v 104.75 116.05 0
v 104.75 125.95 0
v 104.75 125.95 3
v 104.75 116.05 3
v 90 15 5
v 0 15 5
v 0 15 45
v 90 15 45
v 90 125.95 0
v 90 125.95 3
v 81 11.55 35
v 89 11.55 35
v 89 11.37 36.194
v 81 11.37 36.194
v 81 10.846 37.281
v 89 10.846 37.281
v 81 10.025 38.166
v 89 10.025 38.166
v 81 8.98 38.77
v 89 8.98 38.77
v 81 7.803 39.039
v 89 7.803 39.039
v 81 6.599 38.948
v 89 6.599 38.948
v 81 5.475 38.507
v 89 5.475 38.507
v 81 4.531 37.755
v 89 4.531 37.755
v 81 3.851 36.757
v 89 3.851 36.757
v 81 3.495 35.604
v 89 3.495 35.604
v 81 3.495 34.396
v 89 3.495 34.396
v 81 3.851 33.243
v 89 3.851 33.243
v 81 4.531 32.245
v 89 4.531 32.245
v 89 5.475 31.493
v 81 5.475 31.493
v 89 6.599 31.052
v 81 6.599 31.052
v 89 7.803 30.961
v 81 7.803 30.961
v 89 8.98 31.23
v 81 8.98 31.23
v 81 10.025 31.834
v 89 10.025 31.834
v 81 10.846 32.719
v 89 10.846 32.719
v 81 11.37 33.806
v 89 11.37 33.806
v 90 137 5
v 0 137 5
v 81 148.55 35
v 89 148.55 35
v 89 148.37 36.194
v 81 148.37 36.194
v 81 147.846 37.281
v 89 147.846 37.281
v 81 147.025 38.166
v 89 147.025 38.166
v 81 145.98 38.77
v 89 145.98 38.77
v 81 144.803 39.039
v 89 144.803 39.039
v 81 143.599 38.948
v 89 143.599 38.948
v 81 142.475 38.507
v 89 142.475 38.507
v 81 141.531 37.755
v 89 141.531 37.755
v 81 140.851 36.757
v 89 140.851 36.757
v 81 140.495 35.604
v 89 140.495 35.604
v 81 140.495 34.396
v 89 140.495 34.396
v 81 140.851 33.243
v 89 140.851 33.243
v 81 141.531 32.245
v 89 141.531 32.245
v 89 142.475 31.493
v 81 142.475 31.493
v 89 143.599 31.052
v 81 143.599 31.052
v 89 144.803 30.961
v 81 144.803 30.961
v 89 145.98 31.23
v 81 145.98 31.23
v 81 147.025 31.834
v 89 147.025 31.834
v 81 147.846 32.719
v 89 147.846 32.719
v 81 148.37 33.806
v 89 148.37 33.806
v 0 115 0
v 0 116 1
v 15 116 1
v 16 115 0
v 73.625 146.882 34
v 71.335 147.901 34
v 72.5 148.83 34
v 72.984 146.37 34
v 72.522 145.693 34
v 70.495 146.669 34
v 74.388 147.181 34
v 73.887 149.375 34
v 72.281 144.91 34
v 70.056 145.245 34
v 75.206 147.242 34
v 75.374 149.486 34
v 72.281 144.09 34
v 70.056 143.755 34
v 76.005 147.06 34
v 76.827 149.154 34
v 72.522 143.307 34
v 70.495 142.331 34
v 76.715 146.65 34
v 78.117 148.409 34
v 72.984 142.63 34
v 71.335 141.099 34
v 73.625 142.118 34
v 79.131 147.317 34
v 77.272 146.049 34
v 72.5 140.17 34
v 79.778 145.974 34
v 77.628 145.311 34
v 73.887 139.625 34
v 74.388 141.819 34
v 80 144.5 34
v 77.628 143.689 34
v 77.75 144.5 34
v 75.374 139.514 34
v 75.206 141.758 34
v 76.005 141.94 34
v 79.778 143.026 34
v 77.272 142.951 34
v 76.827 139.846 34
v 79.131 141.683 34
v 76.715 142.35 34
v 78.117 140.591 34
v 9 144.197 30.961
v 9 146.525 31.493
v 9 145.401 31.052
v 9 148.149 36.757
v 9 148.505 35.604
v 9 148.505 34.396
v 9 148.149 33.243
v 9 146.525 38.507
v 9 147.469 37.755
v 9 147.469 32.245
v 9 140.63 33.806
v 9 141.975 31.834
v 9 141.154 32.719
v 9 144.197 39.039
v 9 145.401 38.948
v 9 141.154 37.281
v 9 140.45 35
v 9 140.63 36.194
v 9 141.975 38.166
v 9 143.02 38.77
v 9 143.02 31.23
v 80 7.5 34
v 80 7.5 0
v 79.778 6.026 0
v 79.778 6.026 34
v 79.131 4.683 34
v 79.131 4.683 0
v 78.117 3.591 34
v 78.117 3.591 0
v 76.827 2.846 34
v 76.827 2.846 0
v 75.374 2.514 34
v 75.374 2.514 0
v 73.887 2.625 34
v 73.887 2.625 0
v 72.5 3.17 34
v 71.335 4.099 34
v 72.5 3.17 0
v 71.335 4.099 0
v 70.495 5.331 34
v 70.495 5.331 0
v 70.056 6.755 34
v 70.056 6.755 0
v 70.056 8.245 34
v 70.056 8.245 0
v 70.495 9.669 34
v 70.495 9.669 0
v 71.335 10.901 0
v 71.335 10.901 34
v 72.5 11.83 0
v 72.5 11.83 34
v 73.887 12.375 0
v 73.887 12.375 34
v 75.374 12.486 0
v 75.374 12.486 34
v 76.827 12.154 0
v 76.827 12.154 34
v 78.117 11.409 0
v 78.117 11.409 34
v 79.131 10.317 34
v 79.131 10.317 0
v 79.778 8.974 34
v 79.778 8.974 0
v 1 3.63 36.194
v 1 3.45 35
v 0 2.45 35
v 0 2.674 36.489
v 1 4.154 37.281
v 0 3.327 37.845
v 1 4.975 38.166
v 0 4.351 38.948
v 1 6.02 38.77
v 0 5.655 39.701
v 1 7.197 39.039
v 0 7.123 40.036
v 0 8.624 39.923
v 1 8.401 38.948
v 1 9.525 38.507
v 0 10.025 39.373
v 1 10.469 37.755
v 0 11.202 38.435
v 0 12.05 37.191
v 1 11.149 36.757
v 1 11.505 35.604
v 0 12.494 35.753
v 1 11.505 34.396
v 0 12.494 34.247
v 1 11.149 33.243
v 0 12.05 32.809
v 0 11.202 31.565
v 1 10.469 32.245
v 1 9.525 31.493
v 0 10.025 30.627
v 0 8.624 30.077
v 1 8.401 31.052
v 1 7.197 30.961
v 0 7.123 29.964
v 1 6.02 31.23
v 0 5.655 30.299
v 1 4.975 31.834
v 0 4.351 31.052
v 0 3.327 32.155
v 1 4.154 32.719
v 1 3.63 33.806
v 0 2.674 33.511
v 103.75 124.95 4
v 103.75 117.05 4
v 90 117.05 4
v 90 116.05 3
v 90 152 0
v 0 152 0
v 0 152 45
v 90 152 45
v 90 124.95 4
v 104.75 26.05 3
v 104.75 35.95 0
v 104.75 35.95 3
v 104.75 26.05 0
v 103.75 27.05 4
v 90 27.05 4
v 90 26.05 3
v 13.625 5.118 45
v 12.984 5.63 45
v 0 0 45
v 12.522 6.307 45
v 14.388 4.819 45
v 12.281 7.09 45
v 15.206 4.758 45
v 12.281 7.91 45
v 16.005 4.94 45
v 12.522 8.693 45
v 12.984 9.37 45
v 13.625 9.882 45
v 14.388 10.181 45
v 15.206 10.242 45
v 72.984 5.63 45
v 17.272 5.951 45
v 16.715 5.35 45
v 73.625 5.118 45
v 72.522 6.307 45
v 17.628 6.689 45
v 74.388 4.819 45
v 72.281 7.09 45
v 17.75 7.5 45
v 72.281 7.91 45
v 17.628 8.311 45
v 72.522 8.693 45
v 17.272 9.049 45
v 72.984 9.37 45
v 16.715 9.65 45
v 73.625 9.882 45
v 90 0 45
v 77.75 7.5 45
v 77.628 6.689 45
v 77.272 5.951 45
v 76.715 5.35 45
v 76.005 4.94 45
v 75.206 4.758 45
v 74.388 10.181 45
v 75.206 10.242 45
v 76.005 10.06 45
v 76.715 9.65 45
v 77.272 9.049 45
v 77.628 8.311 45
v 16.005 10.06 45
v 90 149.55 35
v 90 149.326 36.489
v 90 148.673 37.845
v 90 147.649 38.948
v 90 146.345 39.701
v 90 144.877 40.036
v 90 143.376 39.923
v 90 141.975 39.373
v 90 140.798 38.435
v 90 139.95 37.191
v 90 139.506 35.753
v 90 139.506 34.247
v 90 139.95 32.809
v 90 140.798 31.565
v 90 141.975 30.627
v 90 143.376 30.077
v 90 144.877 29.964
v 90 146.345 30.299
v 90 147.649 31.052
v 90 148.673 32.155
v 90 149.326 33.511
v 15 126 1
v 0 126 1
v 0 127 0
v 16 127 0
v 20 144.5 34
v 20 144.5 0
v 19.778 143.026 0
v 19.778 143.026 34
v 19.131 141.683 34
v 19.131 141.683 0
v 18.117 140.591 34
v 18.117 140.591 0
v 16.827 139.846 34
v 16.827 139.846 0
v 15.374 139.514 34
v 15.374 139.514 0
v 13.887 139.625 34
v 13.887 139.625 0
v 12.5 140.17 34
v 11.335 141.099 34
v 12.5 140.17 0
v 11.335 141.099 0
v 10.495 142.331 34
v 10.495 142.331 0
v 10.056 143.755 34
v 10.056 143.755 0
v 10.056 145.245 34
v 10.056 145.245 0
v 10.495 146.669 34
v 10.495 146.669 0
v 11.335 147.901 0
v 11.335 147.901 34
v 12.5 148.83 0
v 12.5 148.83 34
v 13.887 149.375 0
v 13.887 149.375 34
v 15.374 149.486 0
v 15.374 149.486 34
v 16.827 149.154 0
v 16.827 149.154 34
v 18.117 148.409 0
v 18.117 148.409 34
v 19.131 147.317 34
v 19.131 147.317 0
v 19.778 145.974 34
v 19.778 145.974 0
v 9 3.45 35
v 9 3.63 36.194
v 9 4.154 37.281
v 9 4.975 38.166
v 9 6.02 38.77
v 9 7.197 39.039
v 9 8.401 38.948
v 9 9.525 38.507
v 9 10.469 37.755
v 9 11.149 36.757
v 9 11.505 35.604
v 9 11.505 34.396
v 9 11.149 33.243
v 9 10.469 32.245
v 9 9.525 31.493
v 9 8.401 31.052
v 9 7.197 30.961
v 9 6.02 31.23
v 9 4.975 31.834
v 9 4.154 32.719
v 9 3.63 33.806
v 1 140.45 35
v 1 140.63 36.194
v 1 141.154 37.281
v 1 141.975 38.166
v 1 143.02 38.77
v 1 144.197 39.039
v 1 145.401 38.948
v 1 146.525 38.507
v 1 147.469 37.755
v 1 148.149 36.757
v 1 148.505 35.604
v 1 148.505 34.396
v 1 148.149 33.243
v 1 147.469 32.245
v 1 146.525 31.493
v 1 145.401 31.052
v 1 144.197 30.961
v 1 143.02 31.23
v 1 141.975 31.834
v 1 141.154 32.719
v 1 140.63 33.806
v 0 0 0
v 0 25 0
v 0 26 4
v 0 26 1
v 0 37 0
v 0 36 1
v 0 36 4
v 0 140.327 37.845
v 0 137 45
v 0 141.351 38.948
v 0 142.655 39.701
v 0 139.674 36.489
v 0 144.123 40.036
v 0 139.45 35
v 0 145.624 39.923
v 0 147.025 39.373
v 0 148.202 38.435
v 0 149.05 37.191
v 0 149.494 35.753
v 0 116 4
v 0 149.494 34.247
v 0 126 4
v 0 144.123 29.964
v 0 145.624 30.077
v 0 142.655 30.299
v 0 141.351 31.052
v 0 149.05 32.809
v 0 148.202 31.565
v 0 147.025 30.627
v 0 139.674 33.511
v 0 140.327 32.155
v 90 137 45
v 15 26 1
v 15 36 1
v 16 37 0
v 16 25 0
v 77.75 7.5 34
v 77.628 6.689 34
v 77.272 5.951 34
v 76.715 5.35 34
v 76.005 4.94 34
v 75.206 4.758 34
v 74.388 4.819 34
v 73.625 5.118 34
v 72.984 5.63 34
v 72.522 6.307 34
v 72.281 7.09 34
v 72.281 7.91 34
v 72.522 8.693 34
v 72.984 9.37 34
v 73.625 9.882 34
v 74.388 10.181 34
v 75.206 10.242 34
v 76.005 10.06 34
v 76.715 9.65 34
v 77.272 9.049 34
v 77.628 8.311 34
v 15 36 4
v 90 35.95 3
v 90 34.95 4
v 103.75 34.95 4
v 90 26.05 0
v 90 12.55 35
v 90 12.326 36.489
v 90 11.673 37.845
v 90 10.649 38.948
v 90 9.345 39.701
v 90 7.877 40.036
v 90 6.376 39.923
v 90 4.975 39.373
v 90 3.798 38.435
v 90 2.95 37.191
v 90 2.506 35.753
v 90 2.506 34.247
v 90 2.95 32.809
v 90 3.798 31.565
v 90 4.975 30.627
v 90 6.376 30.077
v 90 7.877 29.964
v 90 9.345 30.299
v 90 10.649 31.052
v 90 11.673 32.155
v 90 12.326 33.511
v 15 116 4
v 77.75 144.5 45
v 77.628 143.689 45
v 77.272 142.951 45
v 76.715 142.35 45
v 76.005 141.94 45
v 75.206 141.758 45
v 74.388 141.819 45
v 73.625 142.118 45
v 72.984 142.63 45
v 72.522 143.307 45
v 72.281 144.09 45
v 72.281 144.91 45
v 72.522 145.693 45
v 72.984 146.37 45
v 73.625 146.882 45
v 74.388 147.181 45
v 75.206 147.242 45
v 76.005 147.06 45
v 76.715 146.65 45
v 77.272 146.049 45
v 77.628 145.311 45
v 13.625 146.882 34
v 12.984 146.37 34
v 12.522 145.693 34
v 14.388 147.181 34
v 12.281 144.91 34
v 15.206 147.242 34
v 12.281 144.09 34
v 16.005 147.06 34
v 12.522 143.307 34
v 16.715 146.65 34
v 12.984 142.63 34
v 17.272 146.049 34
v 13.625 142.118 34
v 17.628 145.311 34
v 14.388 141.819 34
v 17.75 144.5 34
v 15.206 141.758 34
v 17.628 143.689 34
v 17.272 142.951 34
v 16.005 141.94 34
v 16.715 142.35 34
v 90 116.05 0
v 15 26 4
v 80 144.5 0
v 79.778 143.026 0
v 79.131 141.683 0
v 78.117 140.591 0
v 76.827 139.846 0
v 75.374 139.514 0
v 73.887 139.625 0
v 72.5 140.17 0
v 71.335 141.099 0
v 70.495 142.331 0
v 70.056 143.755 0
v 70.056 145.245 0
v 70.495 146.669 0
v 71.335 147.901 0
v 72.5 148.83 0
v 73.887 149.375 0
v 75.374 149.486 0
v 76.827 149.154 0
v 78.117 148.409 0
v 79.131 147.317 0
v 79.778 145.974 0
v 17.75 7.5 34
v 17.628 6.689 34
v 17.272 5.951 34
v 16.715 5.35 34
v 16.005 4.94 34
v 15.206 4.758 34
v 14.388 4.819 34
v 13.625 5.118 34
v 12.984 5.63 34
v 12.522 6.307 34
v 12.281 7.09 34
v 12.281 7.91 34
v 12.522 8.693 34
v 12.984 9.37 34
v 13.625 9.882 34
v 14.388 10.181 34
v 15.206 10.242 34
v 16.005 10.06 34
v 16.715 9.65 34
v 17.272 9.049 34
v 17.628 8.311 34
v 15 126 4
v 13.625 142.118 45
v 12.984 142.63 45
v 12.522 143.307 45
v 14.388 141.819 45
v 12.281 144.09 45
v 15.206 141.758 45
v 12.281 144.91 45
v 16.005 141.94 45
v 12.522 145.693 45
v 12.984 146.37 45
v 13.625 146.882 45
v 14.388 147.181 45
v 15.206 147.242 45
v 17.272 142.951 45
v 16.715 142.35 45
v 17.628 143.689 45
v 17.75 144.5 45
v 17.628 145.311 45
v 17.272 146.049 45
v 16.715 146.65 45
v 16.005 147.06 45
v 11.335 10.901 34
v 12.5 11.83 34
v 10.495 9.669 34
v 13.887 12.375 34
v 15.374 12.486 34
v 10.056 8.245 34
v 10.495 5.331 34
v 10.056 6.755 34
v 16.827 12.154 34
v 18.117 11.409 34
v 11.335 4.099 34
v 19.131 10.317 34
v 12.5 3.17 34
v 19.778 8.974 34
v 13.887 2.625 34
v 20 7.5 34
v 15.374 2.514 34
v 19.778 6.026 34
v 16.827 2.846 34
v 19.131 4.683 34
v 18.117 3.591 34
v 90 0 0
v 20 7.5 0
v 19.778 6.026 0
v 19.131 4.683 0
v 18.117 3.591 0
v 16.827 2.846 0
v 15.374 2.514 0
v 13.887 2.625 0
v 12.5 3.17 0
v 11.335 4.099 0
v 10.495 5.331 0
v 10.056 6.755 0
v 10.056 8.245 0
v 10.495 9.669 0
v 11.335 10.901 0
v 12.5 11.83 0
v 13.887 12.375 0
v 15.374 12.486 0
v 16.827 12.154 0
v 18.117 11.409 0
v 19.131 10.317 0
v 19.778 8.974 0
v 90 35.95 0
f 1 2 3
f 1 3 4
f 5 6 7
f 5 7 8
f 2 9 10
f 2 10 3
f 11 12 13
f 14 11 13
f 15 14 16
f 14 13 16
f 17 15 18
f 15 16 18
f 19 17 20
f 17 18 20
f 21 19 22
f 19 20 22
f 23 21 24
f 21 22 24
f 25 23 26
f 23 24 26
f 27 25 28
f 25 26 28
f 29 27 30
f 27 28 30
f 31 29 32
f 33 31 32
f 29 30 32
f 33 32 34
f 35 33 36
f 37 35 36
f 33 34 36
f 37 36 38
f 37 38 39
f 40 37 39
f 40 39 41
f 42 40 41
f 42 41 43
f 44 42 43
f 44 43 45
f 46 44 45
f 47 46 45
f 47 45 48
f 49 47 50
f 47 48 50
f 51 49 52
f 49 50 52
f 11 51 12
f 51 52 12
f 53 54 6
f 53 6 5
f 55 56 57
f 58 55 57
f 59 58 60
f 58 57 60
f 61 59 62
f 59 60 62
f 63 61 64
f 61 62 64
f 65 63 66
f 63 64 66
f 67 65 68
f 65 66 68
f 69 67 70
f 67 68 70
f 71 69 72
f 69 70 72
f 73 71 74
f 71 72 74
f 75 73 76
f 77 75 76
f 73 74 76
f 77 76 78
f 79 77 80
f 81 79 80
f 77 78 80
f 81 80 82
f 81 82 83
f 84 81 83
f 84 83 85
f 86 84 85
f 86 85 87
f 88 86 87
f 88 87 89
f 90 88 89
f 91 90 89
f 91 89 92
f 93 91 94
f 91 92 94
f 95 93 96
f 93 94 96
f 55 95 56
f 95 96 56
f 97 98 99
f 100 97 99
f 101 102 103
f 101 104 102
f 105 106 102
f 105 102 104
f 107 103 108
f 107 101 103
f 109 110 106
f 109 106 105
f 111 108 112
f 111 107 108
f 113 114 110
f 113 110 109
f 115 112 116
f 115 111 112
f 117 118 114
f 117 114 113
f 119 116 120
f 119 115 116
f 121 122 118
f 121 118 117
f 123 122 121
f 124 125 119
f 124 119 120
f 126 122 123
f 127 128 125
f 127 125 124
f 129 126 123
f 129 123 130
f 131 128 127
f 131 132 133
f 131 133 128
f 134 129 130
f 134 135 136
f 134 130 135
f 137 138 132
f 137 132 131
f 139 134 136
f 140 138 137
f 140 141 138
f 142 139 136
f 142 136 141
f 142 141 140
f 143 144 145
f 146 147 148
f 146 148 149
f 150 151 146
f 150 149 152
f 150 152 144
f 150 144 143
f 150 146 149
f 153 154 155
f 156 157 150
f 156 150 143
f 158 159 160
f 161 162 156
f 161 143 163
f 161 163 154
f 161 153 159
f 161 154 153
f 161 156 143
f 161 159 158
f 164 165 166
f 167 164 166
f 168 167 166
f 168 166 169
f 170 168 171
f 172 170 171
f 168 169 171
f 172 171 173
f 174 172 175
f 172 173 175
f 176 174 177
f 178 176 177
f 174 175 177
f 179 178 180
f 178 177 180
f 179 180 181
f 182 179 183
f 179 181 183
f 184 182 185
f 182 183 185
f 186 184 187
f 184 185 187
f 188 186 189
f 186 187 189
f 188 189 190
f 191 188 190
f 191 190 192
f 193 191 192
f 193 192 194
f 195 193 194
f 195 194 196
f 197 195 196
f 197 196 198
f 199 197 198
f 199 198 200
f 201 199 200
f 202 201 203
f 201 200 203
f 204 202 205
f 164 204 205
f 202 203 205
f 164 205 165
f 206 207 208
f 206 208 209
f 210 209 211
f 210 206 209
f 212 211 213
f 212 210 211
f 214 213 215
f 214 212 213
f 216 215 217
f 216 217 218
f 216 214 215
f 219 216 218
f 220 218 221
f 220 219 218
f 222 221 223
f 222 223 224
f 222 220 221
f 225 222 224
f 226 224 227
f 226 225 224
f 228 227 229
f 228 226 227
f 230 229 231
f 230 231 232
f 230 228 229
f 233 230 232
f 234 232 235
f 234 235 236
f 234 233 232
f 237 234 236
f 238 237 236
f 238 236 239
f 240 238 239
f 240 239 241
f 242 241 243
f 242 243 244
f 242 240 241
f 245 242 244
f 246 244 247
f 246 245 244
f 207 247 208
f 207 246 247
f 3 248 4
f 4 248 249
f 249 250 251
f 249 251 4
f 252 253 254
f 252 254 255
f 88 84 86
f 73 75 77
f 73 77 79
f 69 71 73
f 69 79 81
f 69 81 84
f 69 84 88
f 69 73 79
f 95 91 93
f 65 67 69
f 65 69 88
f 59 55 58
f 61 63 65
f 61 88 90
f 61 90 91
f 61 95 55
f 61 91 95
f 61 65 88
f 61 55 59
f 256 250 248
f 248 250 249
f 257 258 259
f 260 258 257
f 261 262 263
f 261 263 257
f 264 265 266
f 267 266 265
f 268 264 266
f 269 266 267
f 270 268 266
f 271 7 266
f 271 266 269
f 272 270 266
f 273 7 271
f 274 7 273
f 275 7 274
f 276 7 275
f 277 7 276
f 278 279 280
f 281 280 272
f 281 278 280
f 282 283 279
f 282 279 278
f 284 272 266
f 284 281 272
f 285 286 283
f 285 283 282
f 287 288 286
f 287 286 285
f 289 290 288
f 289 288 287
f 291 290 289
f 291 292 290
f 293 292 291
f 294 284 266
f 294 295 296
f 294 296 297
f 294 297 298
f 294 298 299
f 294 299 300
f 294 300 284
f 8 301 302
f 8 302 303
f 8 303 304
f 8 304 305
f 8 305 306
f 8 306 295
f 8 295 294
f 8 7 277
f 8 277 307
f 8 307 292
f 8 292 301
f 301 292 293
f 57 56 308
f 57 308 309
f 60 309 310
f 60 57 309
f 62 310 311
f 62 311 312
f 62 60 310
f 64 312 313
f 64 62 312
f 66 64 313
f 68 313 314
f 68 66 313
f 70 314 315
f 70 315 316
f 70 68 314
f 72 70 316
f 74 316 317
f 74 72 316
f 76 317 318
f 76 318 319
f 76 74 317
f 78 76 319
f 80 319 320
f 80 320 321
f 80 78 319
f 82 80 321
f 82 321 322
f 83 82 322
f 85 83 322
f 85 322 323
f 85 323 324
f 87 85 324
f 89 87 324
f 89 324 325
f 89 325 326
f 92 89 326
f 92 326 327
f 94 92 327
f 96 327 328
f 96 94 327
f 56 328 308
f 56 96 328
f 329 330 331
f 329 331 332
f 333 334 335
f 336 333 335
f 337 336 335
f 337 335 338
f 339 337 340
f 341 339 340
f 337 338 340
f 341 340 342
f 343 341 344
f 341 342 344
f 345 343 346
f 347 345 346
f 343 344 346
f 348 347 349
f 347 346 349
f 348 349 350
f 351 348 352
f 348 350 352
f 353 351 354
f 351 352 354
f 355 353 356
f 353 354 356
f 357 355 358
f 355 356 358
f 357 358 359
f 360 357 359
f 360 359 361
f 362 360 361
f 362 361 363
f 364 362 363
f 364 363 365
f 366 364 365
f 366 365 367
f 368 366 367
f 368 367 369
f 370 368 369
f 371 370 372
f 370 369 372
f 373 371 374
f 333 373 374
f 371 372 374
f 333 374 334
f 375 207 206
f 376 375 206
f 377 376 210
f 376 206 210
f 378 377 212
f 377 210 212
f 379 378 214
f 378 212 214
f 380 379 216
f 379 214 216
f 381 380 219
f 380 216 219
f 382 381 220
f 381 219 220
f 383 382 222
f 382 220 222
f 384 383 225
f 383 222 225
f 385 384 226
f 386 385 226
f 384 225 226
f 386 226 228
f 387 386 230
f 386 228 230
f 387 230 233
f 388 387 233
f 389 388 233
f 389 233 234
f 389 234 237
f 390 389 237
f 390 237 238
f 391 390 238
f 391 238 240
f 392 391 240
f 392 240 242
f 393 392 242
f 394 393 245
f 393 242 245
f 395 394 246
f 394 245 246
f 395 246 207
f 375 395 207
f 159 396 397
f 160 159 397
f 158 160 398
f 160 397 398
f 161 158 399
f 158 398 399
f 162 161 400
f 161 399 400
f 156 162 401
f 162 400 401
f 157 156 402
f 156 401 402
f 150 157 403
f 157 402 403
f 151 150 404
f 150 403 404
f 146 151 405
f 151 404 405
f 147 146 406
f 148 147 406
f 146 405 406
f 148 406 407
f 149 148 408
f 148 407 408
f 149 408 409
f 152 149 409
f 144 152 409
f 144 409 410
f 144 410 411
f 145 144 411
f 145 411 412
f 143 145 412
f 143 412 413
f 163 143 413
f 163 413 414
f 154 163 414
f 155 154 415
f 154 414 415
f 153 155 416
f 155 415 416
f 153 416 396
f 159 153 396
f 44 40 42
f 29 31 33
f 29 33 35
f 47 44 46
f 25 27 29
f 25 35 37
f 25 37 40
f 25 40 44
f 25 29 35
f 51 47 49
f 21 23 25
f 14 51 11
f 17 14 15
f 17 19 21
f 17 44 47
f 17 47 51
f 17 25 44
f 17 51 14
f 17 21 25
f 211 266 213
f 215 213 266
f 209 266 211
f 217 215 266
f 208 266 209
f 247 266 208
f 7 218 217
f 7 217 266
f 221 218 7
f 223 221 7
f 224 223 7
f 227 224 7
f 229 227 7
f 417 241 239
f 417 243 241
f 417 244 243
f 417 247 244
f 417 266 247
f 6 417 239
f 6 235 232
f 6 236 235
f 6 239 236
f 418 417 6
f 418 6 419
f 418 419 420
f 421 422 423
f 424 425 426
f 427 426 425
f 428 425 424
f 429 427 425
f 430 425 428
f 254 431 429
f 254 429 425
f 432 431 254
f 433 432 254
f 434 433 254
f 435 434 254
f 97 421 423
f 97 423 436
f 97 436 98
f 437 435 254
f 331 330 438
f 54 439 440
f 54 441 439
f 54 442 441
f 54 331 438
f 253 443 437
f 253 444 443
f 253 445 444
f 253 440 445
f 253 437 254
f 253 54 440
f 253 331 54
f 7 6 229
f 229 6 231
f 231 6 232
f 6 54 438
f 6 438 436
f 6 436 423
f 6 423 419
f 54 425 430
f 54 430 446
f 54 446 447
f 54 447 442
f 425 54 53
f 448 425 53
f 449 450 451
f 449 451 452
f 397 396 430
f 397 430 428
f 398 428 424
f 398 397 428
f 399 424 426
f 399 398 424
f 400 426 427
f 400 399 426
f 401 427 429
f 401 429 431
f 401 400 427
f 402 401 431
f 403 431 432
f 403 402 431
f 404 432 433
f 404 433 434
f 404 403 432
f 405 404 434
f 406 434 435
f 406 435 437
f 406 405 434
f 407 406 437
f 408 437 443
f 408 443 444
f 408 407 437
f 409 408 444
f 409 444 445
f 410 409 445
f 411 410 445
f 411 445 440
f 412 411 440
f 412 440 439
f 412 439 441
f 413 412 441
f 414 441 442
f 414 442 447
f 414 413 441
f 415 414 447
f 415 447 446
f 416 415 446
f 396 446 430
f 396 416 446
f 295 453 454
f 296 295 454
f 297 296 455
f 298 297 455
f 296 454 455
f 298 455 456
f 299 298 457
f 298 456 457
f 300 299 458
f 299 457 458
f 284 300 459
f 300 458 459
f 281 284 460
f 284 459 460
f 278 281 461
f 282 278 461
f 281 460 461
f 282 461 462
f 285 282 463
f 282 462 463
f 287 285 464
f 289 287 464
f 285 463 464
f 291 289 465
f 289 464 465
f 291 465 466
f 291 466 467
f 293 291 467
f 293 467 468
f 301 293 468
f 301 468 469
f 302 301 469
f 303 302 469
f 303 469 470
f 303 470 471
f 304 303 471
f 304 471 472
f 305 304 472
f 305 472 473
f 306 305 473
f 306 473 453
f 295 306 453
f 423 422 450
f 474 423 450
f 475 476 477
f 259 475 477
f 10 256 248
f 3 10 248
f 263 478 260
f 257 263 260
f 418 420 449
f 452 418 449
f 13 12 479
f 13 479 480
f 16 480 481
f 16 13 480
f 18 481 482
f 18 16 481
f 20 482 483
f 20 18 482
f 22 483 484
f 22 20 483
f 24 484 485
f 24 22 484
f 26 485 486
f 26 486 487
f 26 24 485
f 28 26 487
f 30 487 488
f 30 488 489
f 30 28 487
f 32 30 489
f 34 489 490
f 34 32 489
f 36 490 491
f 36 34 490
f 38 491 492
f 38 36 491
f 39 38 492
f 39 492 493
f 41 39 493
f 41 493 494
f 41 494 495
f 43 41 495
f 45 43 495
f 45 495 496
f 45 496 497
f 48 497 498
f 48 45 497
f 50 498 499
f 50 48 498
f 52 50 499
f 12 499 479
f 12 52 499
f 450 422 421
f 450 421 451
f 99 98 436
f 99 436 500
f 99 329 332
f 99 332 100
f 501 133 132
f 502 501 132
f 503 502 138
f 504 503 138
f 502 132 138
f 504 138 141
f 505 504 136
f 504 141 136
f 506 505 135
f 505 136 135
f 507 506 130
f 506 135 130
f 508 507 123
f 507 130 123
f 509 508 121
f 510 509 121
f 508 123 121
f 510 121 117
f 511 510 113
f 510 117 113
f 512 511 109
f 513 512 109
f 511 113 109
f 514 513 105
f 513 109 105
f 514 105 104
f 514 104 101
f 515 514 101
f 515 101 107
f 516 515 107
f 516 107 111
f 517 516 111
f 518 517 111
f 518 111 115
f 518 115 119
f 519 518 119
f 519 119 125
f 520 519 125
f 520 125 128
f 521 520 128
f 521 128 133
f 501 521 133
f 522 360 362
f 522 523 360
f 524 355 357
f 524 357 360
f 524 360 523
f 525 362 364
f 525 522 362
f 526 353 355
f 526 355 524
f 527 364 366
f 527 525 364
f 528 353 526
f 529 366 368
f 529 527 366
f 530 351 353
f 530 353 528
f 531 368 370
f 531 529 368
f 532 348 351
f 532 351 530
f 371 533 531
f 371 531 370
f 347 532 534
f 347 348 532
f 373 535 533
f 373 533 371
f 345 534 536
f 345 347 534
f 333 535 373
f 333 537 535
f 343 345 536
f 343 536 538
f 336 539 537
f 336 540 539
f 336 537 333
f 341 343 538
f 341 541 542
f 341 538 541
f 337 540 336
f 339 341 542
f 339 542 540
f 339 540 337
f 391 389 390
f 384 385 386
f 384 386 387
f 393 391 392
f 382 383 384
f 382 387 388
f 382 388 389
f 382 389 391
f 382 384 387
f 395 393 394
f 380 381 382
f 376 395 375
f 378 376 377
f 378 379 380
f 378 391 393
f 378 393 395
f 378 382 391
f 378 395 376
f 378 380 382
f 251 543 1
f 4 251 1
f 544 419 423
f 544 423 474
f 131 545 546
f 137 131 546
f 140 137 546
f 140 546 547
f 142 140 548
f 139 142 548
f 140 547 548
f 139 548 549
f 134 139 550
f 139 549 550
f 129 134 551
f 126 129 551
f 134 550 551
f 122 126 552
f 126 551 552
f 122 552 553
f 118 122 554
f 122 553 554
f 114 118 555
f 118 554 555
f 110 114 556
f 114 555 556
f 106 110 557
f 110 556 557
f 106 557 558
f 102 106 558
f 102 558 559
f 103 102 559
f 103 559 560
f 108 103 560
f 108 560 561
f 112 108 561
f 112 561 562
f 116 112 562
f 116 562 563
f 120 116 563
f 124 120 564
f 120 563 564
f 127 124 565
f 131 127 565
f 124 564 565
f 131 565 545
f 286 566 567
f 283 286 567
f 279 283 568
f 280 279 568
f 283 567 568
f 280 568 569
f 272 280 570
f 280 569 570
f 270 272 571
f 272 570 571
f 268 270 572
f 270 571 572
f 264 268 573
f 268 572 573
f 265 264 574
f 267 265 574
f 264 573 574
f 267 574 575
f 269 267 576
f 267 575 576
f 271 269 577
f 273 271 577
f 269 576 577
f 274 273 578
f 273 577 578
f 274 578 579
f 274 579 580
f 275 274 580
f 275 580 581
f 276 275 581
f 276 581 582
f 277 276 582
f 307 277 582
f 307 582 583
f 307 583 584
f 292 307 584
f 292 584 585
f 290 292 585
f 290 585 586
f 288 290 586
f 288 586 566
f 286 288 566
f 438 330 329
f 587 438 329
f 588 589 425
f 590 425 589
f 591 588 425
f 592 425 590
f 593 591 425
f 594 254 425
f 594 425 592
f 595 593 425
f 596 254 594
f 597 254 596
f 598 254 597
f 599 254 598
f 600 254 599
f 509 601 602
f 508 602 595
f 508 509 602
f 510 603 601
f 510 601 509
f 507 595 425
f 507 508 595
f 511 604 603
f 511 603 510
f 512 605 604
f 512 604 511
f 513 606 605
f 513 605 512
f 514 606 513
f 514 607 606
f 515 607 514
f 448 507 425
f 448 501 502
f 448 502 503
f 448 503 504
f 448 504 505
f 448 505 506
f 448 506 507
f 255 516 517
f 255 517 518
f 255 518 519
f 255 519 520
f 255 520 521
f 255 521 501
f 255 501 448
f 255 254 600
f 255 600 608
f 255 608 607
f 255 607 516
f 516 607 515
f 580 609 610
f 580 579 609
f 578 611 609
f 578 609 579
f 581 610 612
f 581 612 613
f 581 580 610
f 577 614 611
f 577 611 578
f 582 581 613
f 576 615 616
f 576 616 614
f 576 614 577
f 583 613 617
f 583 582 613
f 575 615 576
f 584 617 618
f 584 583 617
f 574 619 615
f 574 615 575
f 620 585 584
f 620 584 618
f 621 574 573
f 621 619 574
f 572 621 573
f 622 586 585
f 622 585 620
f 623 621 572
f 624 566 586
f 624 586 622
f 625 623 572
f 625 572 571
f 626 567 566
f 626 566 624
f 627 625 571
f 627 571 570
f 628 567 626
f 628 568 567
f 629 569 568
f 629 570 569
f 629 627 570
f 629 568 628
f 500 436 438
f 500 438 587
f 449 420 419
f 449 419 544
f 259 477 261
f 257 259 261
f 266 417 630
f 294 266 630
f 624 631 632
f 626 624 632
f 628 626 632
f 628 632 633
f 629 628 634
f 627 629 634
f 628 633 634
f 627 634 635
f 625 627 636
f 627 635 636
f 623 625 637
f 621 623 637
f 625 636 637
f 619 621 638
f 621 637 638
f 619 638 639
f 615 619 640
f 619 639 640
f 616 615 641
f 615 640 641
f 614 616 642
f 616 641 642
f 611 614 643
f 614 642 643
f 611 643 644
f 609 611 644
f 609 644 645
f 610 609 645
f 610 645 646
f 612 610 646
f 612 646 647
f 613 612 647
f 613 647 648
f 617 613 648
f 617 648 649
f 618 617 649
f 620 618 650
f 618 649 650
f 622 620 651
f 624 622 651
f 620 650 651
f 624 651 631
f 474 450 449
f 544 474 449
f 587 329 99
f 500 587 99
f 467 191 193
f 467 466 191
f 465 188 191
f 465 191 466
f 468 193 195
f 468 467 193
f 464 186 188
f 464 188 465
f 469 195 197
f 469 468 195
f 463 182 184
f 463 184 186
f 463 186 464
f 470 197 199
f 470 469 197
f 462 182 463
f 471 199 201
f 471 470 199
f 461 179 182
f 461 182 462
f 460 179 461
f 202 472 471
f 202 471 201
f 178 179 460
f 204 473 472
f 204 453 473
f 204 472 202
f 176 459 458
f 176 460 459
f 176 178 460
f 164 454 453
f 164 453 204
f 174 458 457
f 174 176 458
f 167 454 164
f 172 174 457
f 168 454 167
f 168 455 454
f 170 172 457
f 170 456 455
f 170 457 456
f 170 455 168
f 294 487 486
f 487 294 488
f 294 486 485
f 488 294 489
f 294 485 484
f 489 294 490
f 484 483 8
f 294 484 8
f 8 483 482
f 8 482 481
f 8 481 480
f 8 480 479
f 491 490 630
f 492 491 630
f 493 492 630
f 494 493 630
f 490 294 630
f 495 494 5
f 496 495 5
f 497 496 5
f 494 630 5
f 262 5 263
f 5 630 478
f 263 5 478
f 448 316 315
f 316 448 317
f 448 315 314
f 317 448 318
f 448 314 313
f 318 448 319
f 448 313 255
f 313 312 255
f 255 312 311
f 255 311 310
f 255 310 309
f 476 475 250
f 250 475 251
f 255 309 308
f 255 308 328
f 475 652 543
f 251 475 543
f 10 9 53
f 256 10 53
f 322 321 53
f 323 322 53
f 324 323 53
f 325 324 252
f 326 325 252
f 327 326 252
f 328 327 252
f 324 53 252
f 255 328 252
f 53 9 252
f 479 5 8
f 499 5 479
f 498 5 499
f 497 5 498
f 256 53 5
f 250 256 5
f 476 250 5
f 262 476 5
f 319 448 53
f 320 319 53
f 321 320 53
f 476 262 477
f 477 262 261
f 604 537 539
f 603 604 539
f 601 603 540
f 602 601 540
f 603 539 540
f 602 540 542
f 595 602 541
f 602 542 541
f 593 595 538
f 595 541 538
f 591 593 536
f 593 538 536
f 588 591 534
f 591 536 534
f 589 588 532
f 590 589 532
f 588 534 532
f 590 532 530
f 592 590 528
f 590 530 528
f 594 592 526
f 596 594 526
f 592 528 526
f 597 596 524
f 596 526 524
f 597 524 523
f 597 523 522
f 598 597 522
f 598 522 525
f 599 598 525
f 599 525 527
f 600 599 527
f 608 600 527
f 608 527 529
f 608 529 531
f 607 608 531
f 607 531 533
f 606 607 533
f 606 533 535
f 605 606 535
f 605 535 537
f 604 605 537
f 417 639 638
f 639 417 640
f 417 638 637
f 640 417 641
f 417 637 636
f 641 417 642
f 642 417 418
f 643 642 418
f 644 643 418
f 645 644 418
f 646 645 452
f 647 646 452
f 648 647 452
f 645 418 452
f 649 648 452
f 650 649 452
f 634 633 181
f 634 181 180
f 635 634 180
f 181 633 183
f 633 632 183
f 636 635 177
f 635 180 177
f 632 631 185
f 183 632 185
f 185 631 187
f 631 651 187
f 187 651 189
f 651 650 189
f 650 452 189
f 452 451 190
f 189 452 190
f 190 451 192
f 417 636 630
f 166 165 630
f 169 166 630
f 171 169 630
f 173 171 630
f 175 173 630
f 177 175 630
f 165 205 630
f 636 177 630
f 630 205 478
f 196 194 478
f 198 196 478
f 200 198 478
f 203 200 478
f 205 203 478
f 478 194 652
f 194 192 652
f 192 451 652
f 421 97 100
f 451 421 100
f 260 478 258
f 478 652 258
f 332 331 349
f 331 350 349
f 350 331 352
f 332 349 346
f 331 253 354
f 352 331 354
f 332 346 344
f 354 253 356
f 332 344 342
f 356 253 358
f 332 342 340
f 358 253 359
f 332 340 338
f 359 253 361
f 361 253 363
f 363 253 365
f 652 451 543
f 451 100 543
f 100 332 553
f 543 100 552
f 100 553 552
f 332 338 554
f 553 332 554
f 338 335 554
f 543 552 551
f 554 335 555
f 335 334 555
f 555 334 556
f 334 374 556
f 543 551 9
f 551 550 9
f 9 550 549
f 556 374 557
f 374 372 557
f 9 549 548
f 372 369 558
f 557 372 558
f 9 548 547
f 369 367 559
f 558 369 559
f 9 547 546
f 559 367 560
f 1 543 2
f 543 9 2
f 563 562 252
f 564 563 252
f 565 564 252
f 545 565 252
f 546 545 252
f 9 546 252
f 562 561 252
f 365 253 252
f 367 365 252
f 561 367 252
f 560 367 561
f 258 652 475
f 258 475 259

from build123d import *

# Parameters (mm, degrees)
SKETCH_W        = 90
SKETCH_H        = 152
PAD_DEPTH       = 5
SKETCH001_W     = 14.75
SKETCH001_H     = 9.9
PAD001_DEPTH    = 4
SKETCH002_W     = 15
SKETCH002_H     = 10
POCKET_DEPTH    = 4
SKETCH003_W     = 90
SKETCH003_H     = 15
PAD002_DEPTH    = 40
SKETCH004_R     = 2.75
POCKET001_DEPTH = 45.001
SKETCH005_R     = 5
POCKET002_DEPTH = 34
CHAMFER_SIZE    = 1
SKETCH006_R     = 4.05
POCKET003_DEPTH = 9
SKETCH007_R     = 4.05
POCKET004_DEPTH = 9
CHAMFER001_SIZE = 1


with BuildPart() as part:
    # Sketch → Pad (new body)
    with BuildSketch(Plane.XY):
        with Locations((45, 76)):
            Rectangle(SKETCH_W, SKETCH_H)
    extrude(amount=PAD_DEPTH)

    # Sketch001 (on Face5 of Pad) → Pad001 (join)
    with BuildSketch(Plane(origin=(0, 0, 0), x_dir=(1, 0, 0), z_dir=(0, 0, -1))):
        with Locations((97.375, -31)):
            Rectangle(SKETCH001_W, SKETCH001_H)
        with Locations((97.375, -121)):
            Rectangle(SKETCH001_W, SKETCH001_H)
    extrude(amount=-PAD001_DEPTH)

    # Sketch002 (on Face14 of Pad001) → Pocket (cut)
    with BuildSketch(Plane(origin=(0, 0, 0), x_dir=(1, 0, 0), z_dir=(0, 0, -1))):
        with Locations((7.5, -31)):
            Rectangle(SKETCH002_W, SKETCH002_H)
        with Locations((7.5, -121)):
            Rectangle(SKETCH002_W, SKETCH002_H)
    extrude(amount=-POCKET_DEPTH, mode=Mode.SUBTRACT)

    # Sketch003 (on Face5 of Pocket) → Pad002 (join)
    with BuildSketch(Plane.XY.offset(5)):
        with Locations((45, 144.5)):
            Rectangle(SKETCH003_W, SKETCH003_H)
        with Locations((45, 7.5)):
            Rectangle(SKETCH003_W, SKETCH003_H)
    extrude(amount=PAD002_DEPTH)

    # Sketch004 (on Face1 of Pad002) → Pocket001 (cut, through all)
    with BuildSketch(Plane(origin=(0, 0, 0), x_dir=(1, 0, 0), z_dir=(0, 0, -1))):
        with Locations((15, -7.5)):
            Circle(SKETCH004_R)
        with Locations((75, -7.5)):
            Circle(SKETCH004_R)
        with Locations((75, -144.5)):
            Circle(SKETCH004_R)
        with Locations((15, -144.5)):
            Circle(SKETCH004_R)
    extrude(amount=-POCKET001_DEPTH, mode=Mode.SUBTRACT)

    # Sketch005 (on Face1 of Pocket001) → Pocket002 (cut)
    with BuildSketch(Plane(origin=(0, 0, 0), x_dir=(1, 0, 0), z_dir=(0, 0, -1))):
        with Locations((15, -7.5)):
            Circle(SKETCH005_R)
        with Locations((75, -7.5)):
            Circle(SKETCH005_R)
        with Locations((75, -144.5)):
            Circle(SKETCH005_R)
        with Locations((15, -144.5)):
            Circle(SKETCH005_R)
    extrude(amount=-POCKET002_DEPTH, mode=Mode.SUBTRACT)

    # Chamfer
    chamfer_edges = [part.edges().sort_by_distance(p)[0] for p in [
        (97.375, 116.05, 4),
        (104.75, 121, 4),
        (97.375, 125.95, 4),
        (104.75, 31, 4),
        (97.375, 35.95, 4),
        (97.375, 26.05, 4),
        (7.5, 36, 0),
        (15, 31, 0),
        (7.5, 26, 0),
        (7.5, 126, 0),
        (15, 121, 0),
        (7.5, 116, 0),
    ]]
    chamfer(chamfer_edges, length=CHAMFER_SIZE)

    # Sketch006 (on Face6 of Chamfer) → Pocket003 (cut)
    with BuildSketch(Plane.YZ.offset(90)):
        with Locations((7.5, 35)):
            Circle(SKETCH006_R)
        with Locations((144.5, 35)):
            Circle(SKETCH006_R)
    extrude(amount=-POCKET003_DEPTH, mode=Mode.SUBTRACT)

    # Sketch007 (on Face2 of Pocket003) → Pocket004 (cut)
    with BuildSketch(Plane(origin=(0, 0, 0), x_dir=(0, -1, 0), z_dir=(-1, 0, 0))):
        with Locations((-144.5, 35)):
            Circle(SKETCH007_R)
        with Locations((-7.5, 35)):
            Circle(SKETCH007_R)
    extrude(amount=-POCKET004_DEPTH, mode=Mode.SUBTRACT)

    # Chamfer001
    chamfer001_edges = [part.edges().sort_by_distance(p)[0] for p in [
        (0, 11.55, 35),
        (0, 148.55, 35),
        (90, 3.45, 35),
        (90, 140.45, 35),
    ]]
    chamfer(chamfer001_edges, length=CHAMFER001_SIZE)


solid = part.part
